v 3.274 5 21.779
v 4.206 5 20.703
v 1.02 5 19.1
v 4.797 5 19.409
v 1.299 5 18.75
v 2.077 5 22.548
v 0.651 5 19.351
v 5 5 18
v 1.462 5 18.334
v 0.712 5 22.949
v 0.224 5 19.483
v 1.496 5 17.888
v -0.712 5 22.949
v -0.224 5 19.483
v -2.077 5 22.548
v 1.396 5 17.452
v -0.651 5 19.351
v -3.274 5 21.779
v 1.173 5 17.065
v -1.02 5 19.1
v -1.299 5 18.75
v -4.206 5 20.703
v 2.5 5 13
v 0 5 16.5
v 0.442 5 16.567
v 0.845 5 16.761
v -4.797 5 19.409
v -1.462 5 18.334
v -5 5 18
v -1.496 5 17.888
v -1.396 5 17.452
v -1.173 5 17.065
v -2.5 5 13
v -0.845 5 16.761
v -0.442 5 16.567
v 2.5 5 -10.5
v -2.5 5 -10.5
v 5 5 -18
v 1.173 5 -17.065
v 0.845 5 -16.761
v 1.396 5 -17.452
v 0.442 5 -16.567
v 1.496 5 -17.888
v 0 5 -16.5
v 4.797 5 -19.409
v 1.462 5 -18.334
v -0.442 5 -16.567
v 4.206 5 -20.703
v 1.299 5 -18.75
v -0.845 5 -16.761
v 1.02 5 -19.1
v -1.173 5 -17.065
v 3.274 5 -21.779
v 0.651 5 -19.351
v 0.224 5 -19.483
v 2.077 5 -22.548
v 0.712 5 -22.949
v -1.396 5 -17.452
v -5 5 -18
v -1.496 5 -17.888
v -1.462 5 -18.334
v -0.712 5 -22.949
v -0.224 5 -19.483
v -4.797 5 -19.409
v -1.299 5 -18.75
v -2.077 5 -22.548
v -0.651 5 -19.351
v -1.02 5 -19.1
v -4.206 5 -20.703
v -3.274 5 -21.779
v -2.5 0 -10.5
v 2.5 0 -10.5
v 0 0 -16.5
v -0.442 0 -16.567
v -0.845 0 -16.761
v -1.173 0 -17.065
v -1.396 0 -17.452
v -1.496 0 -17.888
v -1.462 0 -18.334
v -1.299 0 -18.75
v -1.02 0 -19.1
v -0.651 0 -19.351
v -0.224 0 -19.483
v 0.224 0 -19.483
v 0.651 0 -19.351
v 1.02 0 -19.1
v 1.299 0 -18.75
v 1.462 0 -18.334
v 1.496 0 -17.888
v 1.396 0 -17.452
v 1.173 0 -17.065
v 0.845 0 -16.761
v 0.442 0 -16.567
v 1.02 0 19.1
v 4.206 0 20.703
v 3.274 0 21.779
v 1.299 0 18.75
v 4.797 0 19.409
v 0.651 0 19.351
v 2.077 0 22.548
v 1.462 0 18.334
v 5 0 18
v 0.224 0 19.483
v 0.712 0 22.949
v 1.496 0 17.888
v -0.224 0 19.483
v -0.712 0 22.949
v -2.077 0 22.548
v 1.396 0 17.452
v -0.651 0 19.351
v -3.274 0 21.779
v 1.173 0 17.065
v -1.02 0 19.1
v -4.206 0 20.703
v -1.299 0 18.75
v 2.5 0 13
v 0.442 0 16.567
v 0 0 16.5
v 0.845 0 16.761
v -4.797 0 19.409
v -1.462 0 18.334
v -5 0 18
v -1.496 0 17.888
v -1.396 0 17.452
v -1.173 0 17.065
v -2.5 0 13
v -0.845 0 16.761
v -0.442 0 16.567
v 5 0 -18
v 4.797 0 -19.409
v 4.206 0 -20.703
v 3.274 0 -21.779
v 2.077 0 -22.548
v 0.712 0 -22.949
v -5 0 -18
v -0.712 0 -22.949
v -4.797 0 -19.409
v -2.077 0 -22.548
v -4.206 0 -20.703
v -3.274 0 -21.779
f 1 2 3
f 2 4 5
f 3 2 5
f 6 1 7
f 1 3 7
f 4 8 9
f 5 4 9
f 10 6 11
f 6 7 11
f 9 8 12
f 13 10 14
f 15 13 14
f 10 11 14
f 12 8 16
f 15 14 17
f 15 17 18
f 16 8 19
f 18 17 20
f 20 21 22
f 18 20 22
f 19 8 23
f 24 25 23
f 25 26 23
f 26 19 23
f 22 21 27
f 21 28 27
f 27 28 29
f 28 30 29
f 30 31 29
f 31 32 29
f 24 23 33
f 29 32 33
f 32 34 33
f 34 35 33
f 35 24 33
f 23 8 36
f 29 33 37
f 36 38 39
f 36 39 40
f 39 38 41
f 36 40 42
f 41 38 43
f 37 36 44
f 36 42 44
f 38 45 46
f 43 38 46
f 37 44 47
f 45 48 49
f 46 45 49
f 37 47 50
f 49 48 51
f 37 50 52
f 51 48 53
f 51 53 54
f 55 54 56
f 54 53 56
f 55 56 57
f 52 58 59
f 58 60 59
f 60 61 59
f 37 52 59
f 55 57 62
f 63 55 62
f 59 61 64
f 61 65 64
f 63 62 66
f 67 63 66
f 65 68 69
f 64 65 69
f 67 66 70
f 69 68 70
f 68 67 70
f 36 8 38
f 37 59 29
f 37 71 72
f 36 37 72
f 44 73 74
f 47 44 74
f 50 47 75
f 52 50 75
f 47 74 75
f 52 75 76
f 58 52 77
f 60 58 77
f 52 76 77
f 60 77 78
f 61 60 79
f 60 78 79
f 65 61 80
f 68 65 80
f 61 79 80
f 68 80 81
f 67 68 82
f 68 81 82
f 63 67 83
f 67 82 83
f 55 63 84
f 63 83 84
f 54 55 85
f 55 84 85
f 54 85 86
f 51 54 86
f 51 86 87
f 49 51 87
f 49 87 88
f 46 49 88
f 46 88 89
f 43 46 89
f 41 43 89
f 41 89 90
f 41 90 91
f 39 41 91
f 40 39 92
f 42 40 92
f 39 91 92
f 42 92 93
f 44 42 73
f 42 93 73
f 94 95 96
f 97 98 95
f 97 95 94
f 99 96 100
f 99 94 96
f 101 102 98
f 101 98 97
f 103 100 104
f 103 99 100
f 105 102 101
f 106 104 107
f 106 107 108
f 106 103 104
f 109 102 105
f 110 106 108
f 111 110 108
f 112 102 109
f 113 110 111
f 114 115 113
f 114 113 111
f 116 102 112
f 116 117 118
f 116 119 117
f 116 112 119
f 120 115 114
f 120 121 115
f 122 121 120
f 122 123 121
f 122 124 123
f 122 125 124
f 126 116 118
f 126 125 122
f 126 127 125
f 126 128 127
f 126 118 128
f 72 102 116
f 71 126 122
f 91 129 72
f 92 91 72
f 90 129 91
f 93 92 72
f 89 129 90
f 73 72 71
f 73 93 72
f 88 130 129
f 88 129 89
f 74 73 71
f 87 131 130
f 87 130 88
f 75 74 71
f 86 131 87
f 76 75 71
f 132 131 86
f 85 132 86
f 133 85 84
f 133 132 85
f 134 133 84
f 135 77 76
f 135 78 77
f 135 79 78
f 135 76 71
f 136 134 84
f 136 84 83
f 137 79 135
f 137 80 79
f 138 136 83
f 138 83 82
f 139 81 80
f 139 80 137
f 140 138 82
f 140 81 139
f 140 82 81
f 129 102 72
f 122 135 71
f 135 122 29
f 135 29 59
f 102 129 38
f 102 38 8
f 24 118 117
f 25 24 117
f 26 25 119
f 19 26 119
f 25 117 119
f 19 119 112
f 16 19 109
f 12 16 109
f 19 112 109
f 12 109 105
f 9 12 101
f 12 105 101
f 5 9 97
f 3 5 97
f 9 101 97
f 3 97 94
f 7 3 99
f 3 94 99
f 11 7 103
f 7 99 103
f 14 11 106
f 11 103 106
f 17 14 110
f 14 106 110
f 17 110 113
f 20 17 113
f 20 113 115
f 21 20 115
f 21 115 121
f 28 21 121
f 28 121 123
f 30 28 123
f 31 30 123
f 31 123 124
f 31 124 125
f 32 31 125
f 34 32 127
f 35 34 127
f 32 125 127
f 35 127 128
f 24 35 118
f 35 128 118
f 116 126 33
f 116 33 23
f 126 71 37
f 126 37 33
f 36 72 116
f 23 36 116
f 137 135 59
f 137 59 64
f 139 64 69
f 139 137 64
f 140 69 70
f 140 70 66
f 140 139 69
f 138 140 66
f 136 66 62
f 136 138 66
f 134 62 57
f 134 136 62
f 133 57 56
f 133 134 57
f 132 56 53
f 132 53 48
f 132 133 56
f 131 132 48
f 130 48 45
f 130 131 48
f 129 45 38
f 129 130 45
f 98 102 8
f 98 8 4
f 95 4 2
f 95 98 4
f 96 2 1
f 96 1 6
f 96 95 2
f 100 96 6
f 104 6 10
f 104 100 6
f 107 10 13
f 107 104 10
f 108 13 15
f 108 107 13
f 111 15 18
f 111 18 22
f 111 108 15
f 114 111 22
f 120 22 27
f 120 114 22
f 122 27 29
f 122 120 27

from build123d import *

# Parameters (mm, degrees)
EXTRUDE_1_DEPTH     = 5
SKETCH_3_W          = 5
SKETCH_3_H          = 23.5
CUT_EXTRUDE_1_DEPTH = 5
SKETCH_4_R          = 1.5
CUT_EXTRUDE_2_DEPTH = 5


with BuildPart() as part:
    # 草图2 → 凸台-拉伸1 (new body)
    with BuildSketch(Plane(origin=(0, 0, 0), x_dir=(1, 0, 0), z_dir=(0, 1, 0))):
        with BuildLine():
            Line((5, 18), (5, -18))
            ThreePointArc((5, -18), (0, -23), (-5, -18))
            Line((-5, -18), (-5, 18))
            ThreePointArc((-5, 18), (0, 23), (5, 18))
        make_face()
    extrude(amount=EXTRUDE_1_DEPTH)

    # 草图3 → 切除-拉伸1 (cut)
    with BuildSketch(Plane.XZ):
        with Locations((0, 1.25)):
            Rectangle(SKETCH_3_W, SKETCH_3_H)
    extrude(amount=-CUT_EXTRUDE_1_DEPTH, mode=Mode.SUBTRACT)

    # 草图4 → 切除-拉伸2 (cut)
    with BuildSketch(Plane.XZ):
        with Locations(Location((0, 18, 0), (0, 0, 270))):
            Circle(SKETCH_4_R)
        with Locations(Location((0, -18, 0), (0, 0, 90))):
            Circle(SKETCH_4_R)
    extrude(amount=-CUT_EXTRUDE_2_DEPTH, mode=Mode.SUBTRACT)


solid = part.part
